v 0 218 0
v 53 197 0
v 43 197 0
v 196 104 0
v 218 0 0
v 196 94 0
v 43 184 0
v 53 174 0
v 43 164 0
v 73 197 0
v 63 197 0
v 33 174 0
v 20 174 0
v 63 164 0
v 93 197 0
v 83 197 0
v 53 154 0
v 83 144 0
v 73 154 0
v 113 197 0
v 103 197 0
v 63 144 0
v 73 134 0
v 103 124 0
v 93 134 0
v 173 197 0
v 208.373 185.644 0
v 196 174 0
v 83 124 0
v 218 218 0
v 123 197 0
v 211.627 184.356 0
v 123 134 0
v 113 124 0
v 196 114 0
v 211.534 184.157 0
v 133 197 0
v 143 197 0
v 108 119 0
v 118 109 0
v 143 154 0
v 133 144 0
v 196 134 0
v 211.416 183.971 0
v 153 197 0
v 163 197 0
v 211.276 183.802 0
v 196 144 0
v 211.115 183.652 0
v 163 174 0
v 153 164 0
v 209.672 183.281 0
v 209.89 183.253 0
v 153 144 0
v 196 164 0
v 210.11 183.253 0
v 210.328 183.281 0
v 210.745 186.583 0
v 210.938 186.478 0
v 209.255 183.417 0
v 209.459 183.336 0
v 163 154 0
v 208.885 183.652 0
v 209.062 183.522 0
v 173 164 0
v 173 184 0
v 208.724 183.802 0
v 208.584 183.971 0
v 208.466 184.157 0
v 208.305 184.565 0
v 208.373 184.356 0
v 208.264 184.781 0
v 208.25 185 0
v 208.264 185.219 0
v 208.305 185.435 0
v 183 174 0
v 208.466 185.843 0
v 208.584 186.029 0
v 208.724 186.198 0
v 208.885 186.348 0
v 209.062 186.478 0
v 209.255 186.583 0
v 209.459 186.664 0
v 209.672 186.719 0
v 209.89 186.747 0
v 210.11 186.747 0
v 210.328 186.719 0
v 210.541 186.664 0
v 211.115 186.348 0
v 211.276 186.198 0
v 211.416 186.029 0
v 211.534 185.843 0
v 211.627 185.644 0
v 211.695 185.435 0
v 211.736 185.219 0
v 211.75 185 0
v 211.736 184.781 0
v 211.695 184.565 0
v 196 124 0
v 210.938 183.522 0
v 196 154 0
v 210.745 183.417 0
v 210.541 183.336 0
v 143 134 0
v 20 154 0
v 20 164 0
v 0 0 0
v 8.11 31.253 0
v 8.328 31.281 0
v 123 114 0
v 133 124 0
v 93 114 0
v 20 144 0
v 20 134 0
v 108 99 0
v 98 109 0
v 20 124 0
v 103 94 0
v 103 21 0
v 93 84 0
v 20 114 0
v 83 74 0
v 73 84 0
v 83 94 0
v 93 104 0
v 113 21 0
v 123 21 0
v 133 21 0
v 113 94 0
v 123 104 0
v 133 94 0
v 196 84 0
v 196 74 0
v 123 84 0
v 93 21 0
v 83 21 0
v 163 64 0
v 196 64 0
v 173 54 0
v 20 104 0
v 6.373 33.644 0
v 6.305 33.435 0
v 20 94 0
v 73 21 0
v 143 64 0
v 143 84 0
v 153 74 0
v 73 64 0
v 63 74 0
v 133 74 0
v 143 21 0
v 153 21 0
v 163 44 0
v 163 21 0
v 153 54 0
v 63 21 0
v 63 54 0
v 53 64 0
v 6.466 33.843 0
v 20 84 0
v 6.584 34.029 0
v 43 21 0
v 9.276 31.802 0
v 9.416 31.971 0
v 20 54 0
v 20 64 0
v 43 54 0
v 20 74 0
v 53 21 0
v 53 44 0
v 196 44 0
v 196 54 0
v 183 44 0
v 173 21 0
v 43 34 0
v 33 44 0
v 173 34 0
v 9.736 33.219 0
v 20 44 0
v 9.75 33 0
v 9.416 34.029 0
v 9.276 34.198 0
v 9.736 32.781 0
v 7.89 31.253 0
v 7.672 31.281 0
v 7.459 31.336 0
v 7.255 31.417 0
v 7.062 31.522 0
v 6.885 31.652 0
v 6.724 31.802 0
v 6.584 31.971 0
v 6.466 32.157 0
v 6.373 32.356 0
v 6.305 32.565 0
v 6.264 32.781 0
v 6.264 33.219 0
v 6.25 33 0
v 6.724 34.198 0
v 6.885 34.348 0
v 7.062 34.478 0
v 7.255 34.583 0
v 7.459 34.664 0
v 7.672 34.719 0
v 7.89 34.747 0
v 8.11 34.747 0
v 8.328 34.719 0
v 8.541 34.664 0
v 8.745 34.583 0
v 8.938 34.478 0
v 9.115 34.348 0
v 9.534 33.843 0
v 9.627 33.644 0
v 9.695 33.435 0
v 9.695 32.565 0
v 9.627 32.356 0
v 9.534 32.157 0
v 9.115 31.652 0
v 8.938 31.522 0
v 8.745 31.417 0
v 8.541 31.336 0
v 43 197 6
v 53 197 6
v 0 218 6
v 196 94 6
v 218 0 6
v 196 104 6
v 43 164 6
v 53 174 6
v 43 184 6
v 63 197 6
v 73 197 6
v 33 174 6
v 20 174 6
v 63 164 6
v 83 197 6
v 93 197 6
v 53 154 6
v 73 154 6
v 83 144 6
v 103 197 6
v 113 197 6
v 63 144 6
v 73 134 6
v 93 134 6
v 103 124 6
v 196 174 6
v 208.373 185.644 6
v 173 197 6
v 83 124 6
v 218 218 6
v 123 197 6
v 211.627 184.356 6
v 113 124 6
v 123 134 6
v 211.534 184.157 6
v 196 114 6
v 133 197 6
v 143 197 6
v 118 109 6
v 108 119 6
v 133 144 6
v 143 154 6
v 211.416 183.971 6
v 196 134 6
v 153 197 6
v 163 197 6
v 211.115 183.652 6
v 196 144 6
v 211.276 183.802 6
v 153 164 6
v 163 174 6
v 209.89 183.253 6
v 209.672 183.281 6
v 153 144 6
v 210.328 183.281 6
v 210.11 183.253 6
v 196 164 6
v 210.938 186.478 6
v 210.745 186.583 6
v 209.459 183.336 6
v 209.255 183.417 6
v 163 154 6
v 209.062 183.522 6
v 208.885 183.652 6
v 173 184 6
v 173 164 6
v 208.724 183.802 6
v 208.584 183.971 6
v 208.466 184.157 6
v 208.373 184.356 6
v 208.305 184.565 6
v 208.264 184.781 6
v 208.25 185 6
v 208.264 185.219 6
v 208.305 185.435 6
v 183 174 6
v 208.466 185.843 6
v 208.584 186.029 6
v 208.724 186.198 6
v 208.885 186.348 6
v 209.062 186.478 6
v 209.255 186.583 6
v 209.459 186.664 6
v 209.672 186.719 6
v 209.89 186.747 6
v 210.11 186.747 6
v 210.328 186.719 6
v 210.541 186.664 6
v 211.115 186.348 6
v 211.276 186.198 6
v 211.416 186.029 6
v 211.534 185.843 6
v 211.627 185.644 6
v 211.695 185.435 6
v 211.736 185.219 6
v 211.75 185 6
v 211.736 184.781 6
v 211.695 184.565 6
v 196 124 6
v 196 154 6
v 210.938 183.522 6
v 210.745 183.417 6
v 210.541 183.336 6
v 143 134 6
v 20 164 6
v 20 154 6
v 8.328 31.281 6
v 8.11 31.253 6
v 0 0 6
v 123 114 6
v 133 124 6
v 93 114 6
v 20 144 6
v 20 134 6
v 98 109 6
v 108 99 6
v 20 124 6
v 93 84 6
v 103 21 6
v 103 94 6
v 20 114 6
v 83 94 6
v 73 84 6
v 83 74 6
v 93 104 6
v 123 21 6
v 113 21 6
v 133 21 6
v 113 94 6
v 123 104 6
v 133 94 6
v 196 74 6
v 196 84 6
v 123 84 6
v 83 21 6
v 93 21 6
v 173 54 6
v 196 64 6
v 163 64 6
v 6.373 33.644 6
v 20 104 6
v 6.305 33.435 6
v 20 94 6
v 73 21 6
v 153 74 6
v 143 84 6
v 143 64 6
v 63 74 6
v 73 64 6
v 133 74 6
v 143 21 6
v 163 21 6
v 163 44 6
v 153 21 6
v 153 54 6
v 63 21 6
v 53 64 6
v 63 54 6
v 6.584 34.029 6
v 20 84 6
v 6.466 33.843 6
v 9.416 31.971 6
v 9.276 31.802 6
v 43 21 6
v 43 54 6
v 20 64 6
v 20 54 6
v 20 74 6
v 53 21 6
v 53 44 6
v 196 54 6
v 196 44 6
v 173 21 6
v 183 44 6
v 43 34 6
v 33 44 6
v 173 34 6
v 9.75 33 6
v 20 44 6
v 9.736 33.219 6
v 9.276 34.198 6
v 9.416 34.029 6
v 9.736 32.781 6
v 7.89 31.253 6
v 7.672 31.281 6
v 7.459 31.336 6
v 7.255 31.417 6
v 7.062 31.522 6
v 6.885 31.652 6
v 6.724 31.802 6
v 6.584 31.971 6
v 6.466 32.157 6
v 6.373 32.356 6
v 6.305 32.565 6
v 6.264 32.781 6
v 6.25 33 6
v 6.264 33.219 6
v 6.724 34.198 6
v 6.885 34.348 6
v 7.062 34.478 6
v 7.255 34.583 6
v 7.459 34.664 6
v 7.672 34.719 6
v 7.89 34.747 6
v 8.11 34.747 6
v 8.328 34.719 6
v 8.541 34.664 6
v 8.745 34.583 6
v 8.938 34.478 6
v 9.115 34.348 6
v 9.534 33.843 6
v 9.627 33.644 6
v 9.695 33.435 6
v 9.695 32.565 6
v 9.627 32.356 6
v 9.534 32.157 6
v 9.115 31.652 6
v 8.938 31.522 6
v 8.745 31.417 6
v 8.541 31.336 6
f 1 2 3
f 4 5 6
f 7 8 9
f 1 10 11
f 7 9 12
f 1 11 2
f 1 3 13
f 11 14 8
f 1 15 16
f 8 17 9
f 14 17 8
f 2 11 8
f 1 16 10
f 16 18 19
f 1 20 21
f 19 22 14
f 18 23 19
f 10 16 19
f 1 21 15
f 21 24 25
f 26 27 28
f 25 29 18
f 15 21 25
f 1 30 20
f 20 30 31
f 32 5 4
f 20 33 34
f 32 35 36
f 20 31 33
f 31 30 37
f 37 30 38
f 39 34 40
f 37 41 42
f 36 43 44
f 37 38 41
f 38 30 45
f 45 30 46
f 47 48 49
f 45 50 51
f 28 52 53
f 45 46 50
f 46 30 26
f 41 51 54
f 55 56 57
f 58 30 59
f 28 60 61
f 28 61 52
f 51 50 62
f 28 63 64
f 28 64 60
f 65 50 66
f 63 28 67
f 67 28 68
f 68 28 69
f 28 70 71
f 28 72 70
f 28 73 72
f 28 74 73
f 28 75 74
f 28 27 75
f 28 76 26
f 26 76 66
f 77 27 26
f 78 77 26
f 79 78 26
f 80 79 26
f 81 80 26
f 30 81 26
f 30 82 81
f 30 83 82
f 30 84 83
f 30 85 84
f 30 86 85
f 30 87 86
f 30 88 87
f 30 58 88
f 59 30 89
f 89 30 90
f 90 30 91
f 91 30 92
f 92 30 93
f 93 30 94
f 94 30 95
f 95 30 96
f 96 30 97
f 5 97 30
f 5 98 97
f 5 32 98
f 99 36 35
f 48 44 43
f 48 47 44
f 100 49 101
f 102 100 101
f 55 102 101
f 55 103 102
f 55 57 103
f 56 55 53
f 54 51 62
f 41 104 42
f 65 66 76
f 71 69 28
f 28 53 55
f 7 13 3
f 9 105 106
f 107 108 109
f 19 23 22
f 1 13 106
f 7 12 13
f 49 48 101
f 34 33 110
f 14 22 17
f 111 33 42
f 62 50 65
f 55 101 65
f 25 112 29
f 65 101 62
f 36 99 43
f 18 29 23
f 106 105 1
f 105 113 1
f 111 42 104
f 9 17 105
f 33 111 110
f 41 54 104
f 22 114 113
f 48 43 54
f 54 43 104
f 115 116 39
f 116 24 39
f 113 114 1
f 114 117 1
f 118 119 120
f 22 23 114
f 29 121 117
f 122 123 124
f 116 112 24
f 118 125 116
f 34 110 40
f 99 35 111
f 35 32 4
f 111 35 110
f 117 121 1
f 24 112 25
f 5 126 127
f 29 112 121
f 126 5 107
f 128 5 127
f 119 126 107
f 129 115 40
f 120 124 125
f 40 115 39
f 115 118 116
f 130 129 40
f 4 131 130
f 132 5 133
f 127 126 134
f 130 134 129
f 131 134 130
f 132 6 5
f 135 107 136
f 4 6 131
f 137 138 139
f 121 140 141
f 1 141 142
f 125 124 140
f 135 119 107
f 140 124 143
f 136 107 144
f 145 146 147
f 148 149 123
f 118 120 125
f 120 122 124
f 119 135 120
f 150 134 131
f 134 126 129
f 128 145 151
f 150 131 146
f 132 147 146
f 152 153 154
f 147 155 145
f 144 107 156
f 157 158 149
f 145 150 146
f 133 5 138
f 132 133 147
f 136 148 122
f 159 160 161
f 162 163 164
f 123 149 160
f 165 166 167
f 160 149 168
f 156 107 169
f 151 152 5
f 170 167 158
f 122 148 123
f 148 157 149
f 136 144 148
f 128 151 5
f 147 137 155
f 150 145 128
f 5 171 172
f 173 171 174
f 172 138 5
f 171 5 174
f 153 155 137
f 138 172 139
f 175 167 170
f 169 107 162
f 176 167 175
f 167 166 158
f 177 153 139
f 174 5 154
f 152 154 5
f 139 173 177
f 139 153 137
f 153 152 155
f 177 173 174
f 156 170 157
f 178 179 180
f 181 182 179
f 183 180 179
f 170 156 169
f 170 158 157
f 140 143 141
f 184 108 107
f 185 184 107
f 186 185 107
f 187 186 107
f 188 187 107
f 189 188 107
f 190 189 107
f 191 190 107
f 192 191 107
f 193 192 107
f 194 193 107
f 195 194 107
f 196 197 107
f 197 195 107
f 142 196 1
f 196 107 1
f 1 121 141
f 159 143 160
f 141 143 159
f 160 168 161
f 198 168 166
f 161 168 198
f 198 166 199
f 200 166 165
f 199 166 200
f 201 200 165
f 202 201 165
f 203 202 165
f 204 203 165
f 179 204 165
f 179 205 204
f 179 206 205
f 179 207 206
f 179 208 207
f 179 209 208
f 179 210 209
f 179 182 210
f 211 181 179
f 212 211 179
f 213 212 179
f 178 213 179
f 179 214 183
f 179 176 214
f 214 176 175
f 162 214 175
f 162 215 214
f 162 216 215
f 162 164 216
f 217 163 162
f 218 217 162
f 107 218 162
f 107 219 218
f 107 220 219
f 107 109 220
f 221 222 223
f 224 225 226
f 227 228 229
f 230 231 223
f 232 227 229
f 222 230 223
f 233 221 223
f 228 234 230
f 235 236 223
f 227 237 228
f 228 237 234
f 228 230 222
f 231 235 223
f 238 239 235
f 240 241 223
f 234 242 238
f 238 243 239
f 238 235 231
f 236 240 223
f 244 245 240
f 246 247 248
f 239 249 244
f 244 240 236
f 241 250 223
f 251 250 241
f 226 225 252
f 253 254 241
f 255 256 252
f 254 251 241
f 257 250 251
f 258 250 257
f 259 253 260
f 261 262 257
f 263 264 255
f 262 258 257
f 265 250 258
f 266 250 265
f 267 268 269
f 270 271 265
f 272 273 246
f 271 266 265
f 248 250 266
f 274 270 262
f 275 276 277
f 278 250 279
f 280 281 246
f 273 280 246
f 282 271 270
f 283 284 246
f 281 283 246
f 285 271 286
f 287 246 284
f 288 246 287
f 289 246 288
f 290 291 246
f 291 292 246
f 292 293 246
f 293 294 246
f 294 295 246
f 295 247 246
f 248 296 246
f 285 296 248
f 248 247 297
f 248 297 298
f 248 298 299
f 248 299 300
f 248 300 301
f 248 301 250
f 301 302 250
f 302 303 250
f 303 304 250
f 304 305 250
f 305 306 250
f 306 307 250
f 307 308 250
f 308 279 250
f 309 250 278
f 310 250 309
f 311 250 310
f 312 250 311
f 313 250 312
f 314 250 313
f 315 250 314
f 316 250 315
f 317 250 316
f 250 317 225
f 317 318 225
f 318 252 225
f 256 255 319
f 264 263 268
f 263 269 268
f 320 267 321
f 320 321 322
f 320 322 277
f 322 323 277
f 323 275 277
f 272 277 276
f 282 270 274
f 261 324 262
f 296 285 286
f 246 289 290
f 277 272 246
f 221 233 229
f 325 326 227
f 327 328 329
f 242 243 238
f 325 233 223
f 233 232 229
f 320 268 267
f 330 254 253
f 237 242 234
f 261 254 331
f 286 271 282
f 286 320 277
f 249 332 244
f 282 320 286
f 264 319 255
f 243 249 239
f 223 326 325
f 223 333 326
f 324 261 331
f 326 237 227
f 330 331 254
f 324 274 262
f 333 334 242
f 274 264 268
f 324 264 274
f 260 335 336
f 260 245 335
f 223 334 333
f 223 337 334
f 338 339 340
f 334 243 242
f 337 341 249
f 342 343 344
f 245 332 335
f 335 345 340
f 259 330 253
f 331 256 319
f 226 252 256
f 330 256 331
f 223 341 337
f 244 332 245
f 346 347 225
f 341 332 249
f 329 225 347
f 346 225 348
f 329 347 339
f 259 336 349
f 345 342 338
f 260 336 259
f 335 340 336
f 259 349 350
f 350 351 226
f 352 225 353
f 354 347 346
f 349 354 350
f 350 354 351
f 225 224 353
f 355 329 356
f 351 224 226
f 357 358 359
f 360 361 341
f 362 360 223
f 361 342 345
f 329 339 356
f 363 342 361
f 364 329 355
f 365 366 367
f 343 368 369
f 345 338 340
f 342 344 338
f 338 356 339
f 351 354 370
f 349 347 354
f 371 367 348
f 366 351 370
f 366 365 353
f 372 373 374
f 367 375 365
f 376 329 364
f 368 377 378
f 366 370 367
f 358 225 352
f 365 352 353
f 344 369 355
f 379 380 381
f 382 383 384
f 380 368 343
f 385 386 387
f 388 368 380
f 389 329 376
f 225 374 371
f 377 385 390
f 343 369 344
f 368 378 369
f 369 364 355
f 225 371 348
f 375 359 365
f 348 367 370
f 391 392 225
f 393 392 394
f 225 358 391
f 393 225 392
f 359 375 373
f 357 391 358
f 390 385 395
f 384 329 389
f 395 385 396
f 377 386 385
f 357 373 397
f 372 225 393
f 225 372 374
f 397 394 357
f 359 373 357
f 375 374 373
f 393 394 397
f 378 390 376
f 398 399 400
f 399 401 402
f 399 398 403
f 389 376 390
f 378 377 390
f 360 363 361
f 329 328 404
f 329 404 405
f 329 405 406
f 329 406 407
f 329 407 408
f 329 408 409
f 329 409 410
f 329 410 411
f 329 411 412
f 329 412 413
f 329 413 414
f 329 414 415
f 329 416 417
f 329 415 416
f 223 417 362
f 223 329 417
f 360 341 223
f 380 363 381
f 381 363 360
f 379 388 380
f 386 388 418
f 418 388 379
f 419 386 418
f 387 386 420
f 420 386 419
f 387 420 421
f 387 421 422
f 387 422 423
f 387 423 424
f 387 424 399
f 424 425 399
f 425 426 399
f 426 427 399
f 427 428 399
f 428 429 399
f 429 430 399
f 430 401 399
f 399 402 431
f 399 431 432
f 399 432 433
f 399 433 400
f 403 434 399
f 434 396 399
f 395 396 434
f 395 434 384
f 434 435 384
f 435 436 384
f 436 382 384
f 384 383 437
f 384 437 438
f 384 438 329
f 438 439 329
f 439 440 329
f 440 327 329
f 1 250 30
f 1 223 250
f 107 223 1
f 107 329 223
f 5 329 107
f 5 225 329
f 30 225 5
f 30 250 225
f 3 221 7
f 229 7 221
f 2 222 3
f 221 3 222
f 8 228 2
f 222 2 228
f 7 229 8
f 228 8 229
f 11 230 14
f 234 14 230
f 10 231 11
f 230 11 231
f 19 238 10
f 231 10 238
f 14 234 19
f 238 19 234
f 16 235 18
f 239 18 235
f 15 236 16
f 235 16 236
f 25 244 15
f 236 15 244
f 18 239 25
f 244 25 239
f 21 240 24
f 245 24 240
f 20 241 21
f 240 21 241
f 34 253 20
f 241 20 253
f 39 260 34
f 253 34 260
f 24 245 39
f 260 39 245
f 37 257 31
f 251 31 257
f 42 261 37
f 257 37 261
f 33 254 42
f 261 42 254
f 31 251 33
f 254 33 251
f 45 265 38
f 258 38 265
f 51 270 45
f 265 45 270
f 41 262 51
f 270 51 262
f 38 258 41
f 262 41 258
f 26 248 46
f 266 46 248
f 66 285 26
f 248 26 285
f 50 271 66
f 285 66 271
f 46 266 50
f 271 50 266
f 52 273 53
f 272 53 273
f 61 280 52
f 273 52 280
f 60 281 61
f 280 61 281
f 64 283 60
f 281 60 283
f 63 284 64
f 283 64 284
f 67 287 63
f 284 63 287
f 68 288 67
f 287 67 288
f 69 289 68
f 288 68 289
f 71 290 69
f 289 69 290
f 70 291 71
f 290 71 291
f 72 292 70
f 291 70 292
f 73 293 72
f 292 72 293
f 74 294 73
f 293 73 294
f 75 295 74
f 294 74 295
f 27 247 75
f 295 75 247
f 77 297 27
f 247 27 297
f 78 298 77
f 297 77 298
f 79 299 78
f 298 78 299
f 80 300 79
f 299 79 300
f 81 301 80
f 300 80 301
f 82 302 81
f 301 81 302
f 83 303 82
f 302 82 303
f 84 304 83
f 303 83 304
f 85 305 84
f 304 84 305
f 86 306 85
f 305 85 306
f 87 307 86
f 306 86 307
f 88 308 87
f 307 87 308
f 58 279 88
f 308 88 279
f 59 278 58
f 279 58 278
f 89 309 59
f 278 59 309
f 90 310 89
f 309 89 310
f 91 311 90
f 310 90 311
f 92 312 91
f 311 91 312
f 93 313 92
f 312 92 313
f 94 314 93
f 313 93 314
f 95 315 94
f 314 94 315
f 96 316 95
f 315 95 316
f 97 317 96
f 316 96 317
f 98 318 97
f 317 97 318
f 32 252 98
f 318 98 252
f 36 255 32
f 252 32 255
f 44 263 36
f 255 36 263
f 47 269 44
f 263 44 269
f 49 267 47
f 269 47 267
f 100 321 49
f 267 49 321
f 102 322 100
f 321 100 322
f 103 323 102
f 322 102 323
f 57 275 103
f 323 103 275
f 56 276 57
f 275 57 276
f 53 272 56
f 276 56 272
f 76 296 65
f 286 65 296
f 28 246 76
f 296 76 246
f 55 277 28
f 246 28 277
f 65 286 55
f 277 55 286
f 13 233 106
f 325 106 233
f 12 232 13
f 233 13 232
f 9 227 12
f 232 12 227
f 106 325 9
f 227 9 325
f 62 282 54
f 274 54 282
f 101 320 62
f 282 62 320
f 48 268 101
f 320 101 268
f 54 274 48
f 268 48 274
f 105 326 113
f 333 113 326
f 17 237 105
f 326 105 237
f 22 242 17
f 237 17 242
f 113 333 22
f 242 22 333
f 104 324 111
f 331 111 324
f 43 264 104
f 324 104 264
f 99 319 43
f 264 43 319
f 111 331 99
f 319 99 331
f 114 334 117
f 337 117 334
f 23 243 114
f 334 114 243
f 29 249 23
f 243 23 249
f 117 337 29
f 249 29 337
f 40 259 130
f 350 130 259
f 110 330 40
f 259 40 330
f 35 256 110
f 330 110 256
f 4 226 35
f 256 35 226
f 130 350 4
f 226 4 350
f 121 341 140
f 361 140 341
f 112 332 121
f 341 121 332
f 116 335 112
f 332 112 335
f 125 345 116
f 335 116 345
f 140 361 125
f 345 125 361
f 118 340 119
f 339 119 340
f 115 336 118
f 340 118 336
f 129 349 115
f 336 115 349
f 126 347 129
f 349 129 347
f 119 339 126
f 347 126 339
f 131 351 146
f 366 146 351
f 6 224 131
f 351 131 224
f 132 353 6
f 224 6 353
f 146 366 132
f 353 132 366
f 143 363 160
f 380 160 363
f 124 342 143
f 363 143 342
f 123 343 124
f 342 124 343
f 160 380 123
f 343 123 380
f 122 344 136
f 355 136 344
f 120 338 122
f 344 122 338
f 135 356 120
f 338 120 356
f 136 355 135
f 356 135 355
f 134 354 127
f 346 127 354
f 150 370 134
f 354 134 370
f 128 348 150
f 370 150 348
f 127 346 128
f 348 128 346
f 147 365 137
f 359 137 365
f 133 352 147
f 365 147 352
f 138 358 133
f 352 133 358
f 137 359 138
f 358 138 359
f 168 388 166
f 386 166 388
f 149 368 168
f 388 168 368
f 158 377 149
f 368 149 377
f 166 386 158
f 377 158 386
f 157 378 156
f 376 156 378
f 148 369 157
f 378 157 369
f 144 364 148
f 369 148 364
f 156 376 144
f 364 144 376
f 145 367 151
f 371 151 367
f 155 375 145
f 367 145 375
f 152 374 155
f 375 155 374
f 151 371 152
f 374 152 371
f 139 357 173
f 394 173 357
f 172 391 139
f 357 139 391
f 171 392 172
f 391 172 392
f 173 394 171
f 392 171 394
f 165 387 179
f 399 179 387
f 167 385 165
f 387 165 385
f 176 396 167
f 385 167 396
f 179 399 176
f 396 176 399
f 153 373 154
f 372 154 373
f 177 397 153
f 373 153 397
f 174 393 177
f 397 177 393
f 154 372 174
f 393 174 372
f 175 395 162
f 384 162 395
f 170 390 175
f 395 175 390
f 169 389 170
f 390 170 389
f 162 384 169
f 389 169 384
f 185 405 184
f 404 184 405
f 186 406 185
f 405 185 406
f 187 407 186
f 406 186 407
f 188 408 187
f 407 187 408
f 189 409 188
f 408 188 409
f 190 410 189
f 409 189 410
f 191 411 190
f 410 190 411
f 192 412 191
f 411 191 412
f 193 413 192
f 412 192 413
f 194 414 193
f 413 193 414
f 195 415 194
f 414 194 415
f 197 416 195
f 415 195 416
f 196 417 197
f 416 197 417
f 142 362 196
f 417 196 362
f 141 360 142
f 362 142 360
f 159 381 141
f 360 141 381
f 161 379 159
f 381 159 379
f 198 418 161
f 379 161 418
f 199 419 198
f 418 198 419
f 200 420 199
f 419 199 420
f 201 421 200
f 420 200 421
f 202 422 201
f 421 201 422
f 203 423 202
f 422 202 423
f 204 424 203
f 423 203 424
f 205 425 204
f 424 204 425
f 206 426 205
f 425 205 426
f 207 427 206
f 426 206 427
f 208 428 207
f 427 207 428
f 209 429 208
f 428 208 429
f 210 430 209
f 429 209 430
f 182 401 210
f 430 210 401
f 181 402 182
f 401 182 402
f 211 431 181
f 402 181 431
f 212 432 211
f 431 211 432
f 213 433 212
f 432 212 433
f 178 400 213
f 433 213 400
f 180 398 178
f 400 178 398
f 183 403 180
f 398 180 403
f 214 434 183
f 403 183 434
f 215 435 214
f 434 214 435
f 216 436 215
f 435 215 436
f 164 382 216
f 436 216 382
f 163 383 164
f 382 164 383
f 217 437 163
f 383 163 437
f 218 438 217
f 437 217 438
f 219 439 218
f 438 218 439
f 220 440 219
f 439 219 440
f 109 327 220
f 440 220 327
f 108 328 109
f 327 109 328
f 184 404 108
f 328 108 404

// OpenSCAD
// Generated using logo2openscad.becdetat.com

// This is a cover for the drains that are out the front of the house

/* Logo:
// enclosing square
fd 218
rt 90
fd 218
rt 90
fd 218
rt 90
fd 218

pu
home
fd 21
rt 90
fd 43
seth 90

repeat 4 [
    // Ascending
    make "height 23
    repeat 3 [
        pd
        fd 10
        lt 90
        fd :height
        lt 135
        fd sqrt (10^2 + 10^2)
        LT 45
        fd :height - 10
        pu
        lt 90
        fd 20
        make "height :height + 20
    ]

    // middle slot
    make "height :height - 10
    pd
    fd 10
    lt 90
    fd :height
    lt 45
    fd (sqrt (10^2 + 10^2))/2
    lt 90
    fd (sqrt (10^2 + 10^2))/2
    lt 45
    fd :height
    pu
    lt 90
    fd 20

    // Descending
    make "height :height - 20
    repeat 3 [
        pd
        fd 10
        lt 90
        fd :height
        lt 45
        fd sqrt (10^2 + 10^2)
        LT 135
        fd :height + 10
        pu
        lt 90
        fd 20
        make "height :height - 20
    ]

    fd 13
    lt 90
    extmarker
    fd 23
]

pu

home
fd 33
rt 90
fd 8
extmarker [screw 1]

setxy 218, 218
seth 180
fd 33
rt 90
fd 8
extmarker [screw 2]
*/

$fn=50;

linear_extrude(height=6)
difference() {
    // Enclosing square
    polygon(points=[
        [0, 0],
        [0, 218],
        [218, 218],
        [218, 0],
        [0, 0]
    ]);

    polygon(points=[
        [43, 21],
        [53, 21],
        [53, 44],
        [43, 34],
        [43, 21],
        [43, 21]
    ]);

    polygon(points=[
        [63, 21],
        [73, 21],
        [73, 64],
        [63, 54],
        [63, 21],
        [63, 21]
    ]);

    polygon(points=[
        [83, 21],
        [93, 21],
        [93, 84],
        [83, 74],
        [83, 21],
        [83, 21]
    ]);

    polygon(points=[
        [103, 21],
        [113, 21],
        [113, 94],
        [108, 99],
        [103, 94],
        [103, 21],
        [103, 21]
    ]);

    polygon(points=[
        [123, 21],
        [133, 21],
        [133, 74],
        [123, 84],
        [123, 21],
        [123, 21]
    ]);

    polygon(points=[
        [143, 21],
        [153, 21],
        [153, 54],
        [143, 64],
        [143, 21],
        [143, 21]
    ]);

    polygon(points=[
        [163, 21],
        [173, 21],
        [173, 34],
        [163, 44],
        [163, 21],
        [163, 21]
    ]);

    // Marker: x=196, y=21

    polygon(points=[
        [196, 44],
        [196, 54],
        [173, 54],
        [183, 44],
        [196, 44],
        [196, 44]
    ]);

    polygon(points=[
        [196, 64],
        [196, 74],
        [153, 74],
        [163, 64],
        [196, 64],
        [196, 64]
    ]);

    polygon(points=[
        [196, 84],
        [196, 94],
        [133, 94],
        [143, 84],
        [196, 84],
        [196, 84]
    ]);

    polygon(points=[
        [196, 104],
        [196, 114],
        [123, 114],
        [118, 109],
        [123, 104],
        [196, 104],
        [196, 104]
    ]);

    polygon(points=[
        [196, 124],
        [196, 134],
        [143, 134],
        [133, 124],
        [196, 124],
        [196, 124]
    ]);

    polygon(points=[
        [196, 144],
        [196, 154],
        [163, 154],
        [153, 144],
        [196, 144],
        [196, 144]
    ]);

    polygon(points=[
        [196, 164],
        [196, 174],
        [183, 174],
        [173, 164],
        [196, 164],
        [196, 164]
    ]);

    // Marker: x=196, y=197

    polygon(points=[
        [173, 197],
        [163, 197],
        [163, 174],
        [173, 184],
        [173, 197],
        [173, 197]
    ]);

    polygon(points=[
        [153, 197],
        [143, 197],
        [143, 154],
        [153, 164],
        [153, 197],
        [153, 197]
    ]);

    polygon(points=[
        [133, 197],
        [123, 197],
        [123, 134],
        [133, 144],
        [133, 197],
        [133, 197]
    ]);

    polygon(points=[
        [113, 197],
        [103, 197],
        [103, 124],
        [108, 119],
        [113, 124],
        [113, 197],
        [113, 197]
    ]);

    polygon(points=[
        [93, 197],
        [83, 197],
        [83, 144],
        [93, 134],
        [93, 197],
        [93, 197]
    ]);

    polygon(points=[
        [73, 197],
        [63, 197],
        [63, 164],
        [73, 154],
        [73, 197],
        [73, 197]
    ]);

    polygon(points=[
        [53, 197],
        [43, 197],
        [43, 184],
        [53, 174],
        [53, 197],
        [53, 197]
    ]);

    // Marker: x=20, y=197

    polygon(points=[
        [20, 174],
        [20, 164],
        [43, 164],
        [33, 174],
        [20, 174],
        [20, 174]
    ]);

    polygon(points=[
        [20, 154],
        [20, 144],
        [63, 144],
        [53, 154],
        [20, 154],
        [20, 154]
    ]);

    polygon(points=[
        [20, 134],
        [20, 124],
        [83, 124],
        [73, 134],
        [20, 134],
        [20, 134]
    ]);

    polygon(points=[
        [20, 114],
        [20, 104],
        [93, 104],
        [98, 109],
        [93, 114],
        [20, 114],
        [20, 114]
    ]);

    polygon(points=[
        [20, 94],
        [20, 84],
        [73, 84],
        [83, 94],
        [20, 94],
        [20, 94]
    ]);

    polygon(points=[
        [20, 74],
        [20, 64],
        [53, 64],
        [63, 74],
        [20, 74],
        [20, 74]
    ]);

    polygon(points=[
        [20, 54],
        [20, 44],
        [33, 44],
        [43, 54],
        [20, 54],
        [20, 54]
    ]);

     translate([8, 33])
     circle(d=3.5)  ; // screw 1
     translate([210, 185])
     circle(d=3.5)  ; // screw 2
}
